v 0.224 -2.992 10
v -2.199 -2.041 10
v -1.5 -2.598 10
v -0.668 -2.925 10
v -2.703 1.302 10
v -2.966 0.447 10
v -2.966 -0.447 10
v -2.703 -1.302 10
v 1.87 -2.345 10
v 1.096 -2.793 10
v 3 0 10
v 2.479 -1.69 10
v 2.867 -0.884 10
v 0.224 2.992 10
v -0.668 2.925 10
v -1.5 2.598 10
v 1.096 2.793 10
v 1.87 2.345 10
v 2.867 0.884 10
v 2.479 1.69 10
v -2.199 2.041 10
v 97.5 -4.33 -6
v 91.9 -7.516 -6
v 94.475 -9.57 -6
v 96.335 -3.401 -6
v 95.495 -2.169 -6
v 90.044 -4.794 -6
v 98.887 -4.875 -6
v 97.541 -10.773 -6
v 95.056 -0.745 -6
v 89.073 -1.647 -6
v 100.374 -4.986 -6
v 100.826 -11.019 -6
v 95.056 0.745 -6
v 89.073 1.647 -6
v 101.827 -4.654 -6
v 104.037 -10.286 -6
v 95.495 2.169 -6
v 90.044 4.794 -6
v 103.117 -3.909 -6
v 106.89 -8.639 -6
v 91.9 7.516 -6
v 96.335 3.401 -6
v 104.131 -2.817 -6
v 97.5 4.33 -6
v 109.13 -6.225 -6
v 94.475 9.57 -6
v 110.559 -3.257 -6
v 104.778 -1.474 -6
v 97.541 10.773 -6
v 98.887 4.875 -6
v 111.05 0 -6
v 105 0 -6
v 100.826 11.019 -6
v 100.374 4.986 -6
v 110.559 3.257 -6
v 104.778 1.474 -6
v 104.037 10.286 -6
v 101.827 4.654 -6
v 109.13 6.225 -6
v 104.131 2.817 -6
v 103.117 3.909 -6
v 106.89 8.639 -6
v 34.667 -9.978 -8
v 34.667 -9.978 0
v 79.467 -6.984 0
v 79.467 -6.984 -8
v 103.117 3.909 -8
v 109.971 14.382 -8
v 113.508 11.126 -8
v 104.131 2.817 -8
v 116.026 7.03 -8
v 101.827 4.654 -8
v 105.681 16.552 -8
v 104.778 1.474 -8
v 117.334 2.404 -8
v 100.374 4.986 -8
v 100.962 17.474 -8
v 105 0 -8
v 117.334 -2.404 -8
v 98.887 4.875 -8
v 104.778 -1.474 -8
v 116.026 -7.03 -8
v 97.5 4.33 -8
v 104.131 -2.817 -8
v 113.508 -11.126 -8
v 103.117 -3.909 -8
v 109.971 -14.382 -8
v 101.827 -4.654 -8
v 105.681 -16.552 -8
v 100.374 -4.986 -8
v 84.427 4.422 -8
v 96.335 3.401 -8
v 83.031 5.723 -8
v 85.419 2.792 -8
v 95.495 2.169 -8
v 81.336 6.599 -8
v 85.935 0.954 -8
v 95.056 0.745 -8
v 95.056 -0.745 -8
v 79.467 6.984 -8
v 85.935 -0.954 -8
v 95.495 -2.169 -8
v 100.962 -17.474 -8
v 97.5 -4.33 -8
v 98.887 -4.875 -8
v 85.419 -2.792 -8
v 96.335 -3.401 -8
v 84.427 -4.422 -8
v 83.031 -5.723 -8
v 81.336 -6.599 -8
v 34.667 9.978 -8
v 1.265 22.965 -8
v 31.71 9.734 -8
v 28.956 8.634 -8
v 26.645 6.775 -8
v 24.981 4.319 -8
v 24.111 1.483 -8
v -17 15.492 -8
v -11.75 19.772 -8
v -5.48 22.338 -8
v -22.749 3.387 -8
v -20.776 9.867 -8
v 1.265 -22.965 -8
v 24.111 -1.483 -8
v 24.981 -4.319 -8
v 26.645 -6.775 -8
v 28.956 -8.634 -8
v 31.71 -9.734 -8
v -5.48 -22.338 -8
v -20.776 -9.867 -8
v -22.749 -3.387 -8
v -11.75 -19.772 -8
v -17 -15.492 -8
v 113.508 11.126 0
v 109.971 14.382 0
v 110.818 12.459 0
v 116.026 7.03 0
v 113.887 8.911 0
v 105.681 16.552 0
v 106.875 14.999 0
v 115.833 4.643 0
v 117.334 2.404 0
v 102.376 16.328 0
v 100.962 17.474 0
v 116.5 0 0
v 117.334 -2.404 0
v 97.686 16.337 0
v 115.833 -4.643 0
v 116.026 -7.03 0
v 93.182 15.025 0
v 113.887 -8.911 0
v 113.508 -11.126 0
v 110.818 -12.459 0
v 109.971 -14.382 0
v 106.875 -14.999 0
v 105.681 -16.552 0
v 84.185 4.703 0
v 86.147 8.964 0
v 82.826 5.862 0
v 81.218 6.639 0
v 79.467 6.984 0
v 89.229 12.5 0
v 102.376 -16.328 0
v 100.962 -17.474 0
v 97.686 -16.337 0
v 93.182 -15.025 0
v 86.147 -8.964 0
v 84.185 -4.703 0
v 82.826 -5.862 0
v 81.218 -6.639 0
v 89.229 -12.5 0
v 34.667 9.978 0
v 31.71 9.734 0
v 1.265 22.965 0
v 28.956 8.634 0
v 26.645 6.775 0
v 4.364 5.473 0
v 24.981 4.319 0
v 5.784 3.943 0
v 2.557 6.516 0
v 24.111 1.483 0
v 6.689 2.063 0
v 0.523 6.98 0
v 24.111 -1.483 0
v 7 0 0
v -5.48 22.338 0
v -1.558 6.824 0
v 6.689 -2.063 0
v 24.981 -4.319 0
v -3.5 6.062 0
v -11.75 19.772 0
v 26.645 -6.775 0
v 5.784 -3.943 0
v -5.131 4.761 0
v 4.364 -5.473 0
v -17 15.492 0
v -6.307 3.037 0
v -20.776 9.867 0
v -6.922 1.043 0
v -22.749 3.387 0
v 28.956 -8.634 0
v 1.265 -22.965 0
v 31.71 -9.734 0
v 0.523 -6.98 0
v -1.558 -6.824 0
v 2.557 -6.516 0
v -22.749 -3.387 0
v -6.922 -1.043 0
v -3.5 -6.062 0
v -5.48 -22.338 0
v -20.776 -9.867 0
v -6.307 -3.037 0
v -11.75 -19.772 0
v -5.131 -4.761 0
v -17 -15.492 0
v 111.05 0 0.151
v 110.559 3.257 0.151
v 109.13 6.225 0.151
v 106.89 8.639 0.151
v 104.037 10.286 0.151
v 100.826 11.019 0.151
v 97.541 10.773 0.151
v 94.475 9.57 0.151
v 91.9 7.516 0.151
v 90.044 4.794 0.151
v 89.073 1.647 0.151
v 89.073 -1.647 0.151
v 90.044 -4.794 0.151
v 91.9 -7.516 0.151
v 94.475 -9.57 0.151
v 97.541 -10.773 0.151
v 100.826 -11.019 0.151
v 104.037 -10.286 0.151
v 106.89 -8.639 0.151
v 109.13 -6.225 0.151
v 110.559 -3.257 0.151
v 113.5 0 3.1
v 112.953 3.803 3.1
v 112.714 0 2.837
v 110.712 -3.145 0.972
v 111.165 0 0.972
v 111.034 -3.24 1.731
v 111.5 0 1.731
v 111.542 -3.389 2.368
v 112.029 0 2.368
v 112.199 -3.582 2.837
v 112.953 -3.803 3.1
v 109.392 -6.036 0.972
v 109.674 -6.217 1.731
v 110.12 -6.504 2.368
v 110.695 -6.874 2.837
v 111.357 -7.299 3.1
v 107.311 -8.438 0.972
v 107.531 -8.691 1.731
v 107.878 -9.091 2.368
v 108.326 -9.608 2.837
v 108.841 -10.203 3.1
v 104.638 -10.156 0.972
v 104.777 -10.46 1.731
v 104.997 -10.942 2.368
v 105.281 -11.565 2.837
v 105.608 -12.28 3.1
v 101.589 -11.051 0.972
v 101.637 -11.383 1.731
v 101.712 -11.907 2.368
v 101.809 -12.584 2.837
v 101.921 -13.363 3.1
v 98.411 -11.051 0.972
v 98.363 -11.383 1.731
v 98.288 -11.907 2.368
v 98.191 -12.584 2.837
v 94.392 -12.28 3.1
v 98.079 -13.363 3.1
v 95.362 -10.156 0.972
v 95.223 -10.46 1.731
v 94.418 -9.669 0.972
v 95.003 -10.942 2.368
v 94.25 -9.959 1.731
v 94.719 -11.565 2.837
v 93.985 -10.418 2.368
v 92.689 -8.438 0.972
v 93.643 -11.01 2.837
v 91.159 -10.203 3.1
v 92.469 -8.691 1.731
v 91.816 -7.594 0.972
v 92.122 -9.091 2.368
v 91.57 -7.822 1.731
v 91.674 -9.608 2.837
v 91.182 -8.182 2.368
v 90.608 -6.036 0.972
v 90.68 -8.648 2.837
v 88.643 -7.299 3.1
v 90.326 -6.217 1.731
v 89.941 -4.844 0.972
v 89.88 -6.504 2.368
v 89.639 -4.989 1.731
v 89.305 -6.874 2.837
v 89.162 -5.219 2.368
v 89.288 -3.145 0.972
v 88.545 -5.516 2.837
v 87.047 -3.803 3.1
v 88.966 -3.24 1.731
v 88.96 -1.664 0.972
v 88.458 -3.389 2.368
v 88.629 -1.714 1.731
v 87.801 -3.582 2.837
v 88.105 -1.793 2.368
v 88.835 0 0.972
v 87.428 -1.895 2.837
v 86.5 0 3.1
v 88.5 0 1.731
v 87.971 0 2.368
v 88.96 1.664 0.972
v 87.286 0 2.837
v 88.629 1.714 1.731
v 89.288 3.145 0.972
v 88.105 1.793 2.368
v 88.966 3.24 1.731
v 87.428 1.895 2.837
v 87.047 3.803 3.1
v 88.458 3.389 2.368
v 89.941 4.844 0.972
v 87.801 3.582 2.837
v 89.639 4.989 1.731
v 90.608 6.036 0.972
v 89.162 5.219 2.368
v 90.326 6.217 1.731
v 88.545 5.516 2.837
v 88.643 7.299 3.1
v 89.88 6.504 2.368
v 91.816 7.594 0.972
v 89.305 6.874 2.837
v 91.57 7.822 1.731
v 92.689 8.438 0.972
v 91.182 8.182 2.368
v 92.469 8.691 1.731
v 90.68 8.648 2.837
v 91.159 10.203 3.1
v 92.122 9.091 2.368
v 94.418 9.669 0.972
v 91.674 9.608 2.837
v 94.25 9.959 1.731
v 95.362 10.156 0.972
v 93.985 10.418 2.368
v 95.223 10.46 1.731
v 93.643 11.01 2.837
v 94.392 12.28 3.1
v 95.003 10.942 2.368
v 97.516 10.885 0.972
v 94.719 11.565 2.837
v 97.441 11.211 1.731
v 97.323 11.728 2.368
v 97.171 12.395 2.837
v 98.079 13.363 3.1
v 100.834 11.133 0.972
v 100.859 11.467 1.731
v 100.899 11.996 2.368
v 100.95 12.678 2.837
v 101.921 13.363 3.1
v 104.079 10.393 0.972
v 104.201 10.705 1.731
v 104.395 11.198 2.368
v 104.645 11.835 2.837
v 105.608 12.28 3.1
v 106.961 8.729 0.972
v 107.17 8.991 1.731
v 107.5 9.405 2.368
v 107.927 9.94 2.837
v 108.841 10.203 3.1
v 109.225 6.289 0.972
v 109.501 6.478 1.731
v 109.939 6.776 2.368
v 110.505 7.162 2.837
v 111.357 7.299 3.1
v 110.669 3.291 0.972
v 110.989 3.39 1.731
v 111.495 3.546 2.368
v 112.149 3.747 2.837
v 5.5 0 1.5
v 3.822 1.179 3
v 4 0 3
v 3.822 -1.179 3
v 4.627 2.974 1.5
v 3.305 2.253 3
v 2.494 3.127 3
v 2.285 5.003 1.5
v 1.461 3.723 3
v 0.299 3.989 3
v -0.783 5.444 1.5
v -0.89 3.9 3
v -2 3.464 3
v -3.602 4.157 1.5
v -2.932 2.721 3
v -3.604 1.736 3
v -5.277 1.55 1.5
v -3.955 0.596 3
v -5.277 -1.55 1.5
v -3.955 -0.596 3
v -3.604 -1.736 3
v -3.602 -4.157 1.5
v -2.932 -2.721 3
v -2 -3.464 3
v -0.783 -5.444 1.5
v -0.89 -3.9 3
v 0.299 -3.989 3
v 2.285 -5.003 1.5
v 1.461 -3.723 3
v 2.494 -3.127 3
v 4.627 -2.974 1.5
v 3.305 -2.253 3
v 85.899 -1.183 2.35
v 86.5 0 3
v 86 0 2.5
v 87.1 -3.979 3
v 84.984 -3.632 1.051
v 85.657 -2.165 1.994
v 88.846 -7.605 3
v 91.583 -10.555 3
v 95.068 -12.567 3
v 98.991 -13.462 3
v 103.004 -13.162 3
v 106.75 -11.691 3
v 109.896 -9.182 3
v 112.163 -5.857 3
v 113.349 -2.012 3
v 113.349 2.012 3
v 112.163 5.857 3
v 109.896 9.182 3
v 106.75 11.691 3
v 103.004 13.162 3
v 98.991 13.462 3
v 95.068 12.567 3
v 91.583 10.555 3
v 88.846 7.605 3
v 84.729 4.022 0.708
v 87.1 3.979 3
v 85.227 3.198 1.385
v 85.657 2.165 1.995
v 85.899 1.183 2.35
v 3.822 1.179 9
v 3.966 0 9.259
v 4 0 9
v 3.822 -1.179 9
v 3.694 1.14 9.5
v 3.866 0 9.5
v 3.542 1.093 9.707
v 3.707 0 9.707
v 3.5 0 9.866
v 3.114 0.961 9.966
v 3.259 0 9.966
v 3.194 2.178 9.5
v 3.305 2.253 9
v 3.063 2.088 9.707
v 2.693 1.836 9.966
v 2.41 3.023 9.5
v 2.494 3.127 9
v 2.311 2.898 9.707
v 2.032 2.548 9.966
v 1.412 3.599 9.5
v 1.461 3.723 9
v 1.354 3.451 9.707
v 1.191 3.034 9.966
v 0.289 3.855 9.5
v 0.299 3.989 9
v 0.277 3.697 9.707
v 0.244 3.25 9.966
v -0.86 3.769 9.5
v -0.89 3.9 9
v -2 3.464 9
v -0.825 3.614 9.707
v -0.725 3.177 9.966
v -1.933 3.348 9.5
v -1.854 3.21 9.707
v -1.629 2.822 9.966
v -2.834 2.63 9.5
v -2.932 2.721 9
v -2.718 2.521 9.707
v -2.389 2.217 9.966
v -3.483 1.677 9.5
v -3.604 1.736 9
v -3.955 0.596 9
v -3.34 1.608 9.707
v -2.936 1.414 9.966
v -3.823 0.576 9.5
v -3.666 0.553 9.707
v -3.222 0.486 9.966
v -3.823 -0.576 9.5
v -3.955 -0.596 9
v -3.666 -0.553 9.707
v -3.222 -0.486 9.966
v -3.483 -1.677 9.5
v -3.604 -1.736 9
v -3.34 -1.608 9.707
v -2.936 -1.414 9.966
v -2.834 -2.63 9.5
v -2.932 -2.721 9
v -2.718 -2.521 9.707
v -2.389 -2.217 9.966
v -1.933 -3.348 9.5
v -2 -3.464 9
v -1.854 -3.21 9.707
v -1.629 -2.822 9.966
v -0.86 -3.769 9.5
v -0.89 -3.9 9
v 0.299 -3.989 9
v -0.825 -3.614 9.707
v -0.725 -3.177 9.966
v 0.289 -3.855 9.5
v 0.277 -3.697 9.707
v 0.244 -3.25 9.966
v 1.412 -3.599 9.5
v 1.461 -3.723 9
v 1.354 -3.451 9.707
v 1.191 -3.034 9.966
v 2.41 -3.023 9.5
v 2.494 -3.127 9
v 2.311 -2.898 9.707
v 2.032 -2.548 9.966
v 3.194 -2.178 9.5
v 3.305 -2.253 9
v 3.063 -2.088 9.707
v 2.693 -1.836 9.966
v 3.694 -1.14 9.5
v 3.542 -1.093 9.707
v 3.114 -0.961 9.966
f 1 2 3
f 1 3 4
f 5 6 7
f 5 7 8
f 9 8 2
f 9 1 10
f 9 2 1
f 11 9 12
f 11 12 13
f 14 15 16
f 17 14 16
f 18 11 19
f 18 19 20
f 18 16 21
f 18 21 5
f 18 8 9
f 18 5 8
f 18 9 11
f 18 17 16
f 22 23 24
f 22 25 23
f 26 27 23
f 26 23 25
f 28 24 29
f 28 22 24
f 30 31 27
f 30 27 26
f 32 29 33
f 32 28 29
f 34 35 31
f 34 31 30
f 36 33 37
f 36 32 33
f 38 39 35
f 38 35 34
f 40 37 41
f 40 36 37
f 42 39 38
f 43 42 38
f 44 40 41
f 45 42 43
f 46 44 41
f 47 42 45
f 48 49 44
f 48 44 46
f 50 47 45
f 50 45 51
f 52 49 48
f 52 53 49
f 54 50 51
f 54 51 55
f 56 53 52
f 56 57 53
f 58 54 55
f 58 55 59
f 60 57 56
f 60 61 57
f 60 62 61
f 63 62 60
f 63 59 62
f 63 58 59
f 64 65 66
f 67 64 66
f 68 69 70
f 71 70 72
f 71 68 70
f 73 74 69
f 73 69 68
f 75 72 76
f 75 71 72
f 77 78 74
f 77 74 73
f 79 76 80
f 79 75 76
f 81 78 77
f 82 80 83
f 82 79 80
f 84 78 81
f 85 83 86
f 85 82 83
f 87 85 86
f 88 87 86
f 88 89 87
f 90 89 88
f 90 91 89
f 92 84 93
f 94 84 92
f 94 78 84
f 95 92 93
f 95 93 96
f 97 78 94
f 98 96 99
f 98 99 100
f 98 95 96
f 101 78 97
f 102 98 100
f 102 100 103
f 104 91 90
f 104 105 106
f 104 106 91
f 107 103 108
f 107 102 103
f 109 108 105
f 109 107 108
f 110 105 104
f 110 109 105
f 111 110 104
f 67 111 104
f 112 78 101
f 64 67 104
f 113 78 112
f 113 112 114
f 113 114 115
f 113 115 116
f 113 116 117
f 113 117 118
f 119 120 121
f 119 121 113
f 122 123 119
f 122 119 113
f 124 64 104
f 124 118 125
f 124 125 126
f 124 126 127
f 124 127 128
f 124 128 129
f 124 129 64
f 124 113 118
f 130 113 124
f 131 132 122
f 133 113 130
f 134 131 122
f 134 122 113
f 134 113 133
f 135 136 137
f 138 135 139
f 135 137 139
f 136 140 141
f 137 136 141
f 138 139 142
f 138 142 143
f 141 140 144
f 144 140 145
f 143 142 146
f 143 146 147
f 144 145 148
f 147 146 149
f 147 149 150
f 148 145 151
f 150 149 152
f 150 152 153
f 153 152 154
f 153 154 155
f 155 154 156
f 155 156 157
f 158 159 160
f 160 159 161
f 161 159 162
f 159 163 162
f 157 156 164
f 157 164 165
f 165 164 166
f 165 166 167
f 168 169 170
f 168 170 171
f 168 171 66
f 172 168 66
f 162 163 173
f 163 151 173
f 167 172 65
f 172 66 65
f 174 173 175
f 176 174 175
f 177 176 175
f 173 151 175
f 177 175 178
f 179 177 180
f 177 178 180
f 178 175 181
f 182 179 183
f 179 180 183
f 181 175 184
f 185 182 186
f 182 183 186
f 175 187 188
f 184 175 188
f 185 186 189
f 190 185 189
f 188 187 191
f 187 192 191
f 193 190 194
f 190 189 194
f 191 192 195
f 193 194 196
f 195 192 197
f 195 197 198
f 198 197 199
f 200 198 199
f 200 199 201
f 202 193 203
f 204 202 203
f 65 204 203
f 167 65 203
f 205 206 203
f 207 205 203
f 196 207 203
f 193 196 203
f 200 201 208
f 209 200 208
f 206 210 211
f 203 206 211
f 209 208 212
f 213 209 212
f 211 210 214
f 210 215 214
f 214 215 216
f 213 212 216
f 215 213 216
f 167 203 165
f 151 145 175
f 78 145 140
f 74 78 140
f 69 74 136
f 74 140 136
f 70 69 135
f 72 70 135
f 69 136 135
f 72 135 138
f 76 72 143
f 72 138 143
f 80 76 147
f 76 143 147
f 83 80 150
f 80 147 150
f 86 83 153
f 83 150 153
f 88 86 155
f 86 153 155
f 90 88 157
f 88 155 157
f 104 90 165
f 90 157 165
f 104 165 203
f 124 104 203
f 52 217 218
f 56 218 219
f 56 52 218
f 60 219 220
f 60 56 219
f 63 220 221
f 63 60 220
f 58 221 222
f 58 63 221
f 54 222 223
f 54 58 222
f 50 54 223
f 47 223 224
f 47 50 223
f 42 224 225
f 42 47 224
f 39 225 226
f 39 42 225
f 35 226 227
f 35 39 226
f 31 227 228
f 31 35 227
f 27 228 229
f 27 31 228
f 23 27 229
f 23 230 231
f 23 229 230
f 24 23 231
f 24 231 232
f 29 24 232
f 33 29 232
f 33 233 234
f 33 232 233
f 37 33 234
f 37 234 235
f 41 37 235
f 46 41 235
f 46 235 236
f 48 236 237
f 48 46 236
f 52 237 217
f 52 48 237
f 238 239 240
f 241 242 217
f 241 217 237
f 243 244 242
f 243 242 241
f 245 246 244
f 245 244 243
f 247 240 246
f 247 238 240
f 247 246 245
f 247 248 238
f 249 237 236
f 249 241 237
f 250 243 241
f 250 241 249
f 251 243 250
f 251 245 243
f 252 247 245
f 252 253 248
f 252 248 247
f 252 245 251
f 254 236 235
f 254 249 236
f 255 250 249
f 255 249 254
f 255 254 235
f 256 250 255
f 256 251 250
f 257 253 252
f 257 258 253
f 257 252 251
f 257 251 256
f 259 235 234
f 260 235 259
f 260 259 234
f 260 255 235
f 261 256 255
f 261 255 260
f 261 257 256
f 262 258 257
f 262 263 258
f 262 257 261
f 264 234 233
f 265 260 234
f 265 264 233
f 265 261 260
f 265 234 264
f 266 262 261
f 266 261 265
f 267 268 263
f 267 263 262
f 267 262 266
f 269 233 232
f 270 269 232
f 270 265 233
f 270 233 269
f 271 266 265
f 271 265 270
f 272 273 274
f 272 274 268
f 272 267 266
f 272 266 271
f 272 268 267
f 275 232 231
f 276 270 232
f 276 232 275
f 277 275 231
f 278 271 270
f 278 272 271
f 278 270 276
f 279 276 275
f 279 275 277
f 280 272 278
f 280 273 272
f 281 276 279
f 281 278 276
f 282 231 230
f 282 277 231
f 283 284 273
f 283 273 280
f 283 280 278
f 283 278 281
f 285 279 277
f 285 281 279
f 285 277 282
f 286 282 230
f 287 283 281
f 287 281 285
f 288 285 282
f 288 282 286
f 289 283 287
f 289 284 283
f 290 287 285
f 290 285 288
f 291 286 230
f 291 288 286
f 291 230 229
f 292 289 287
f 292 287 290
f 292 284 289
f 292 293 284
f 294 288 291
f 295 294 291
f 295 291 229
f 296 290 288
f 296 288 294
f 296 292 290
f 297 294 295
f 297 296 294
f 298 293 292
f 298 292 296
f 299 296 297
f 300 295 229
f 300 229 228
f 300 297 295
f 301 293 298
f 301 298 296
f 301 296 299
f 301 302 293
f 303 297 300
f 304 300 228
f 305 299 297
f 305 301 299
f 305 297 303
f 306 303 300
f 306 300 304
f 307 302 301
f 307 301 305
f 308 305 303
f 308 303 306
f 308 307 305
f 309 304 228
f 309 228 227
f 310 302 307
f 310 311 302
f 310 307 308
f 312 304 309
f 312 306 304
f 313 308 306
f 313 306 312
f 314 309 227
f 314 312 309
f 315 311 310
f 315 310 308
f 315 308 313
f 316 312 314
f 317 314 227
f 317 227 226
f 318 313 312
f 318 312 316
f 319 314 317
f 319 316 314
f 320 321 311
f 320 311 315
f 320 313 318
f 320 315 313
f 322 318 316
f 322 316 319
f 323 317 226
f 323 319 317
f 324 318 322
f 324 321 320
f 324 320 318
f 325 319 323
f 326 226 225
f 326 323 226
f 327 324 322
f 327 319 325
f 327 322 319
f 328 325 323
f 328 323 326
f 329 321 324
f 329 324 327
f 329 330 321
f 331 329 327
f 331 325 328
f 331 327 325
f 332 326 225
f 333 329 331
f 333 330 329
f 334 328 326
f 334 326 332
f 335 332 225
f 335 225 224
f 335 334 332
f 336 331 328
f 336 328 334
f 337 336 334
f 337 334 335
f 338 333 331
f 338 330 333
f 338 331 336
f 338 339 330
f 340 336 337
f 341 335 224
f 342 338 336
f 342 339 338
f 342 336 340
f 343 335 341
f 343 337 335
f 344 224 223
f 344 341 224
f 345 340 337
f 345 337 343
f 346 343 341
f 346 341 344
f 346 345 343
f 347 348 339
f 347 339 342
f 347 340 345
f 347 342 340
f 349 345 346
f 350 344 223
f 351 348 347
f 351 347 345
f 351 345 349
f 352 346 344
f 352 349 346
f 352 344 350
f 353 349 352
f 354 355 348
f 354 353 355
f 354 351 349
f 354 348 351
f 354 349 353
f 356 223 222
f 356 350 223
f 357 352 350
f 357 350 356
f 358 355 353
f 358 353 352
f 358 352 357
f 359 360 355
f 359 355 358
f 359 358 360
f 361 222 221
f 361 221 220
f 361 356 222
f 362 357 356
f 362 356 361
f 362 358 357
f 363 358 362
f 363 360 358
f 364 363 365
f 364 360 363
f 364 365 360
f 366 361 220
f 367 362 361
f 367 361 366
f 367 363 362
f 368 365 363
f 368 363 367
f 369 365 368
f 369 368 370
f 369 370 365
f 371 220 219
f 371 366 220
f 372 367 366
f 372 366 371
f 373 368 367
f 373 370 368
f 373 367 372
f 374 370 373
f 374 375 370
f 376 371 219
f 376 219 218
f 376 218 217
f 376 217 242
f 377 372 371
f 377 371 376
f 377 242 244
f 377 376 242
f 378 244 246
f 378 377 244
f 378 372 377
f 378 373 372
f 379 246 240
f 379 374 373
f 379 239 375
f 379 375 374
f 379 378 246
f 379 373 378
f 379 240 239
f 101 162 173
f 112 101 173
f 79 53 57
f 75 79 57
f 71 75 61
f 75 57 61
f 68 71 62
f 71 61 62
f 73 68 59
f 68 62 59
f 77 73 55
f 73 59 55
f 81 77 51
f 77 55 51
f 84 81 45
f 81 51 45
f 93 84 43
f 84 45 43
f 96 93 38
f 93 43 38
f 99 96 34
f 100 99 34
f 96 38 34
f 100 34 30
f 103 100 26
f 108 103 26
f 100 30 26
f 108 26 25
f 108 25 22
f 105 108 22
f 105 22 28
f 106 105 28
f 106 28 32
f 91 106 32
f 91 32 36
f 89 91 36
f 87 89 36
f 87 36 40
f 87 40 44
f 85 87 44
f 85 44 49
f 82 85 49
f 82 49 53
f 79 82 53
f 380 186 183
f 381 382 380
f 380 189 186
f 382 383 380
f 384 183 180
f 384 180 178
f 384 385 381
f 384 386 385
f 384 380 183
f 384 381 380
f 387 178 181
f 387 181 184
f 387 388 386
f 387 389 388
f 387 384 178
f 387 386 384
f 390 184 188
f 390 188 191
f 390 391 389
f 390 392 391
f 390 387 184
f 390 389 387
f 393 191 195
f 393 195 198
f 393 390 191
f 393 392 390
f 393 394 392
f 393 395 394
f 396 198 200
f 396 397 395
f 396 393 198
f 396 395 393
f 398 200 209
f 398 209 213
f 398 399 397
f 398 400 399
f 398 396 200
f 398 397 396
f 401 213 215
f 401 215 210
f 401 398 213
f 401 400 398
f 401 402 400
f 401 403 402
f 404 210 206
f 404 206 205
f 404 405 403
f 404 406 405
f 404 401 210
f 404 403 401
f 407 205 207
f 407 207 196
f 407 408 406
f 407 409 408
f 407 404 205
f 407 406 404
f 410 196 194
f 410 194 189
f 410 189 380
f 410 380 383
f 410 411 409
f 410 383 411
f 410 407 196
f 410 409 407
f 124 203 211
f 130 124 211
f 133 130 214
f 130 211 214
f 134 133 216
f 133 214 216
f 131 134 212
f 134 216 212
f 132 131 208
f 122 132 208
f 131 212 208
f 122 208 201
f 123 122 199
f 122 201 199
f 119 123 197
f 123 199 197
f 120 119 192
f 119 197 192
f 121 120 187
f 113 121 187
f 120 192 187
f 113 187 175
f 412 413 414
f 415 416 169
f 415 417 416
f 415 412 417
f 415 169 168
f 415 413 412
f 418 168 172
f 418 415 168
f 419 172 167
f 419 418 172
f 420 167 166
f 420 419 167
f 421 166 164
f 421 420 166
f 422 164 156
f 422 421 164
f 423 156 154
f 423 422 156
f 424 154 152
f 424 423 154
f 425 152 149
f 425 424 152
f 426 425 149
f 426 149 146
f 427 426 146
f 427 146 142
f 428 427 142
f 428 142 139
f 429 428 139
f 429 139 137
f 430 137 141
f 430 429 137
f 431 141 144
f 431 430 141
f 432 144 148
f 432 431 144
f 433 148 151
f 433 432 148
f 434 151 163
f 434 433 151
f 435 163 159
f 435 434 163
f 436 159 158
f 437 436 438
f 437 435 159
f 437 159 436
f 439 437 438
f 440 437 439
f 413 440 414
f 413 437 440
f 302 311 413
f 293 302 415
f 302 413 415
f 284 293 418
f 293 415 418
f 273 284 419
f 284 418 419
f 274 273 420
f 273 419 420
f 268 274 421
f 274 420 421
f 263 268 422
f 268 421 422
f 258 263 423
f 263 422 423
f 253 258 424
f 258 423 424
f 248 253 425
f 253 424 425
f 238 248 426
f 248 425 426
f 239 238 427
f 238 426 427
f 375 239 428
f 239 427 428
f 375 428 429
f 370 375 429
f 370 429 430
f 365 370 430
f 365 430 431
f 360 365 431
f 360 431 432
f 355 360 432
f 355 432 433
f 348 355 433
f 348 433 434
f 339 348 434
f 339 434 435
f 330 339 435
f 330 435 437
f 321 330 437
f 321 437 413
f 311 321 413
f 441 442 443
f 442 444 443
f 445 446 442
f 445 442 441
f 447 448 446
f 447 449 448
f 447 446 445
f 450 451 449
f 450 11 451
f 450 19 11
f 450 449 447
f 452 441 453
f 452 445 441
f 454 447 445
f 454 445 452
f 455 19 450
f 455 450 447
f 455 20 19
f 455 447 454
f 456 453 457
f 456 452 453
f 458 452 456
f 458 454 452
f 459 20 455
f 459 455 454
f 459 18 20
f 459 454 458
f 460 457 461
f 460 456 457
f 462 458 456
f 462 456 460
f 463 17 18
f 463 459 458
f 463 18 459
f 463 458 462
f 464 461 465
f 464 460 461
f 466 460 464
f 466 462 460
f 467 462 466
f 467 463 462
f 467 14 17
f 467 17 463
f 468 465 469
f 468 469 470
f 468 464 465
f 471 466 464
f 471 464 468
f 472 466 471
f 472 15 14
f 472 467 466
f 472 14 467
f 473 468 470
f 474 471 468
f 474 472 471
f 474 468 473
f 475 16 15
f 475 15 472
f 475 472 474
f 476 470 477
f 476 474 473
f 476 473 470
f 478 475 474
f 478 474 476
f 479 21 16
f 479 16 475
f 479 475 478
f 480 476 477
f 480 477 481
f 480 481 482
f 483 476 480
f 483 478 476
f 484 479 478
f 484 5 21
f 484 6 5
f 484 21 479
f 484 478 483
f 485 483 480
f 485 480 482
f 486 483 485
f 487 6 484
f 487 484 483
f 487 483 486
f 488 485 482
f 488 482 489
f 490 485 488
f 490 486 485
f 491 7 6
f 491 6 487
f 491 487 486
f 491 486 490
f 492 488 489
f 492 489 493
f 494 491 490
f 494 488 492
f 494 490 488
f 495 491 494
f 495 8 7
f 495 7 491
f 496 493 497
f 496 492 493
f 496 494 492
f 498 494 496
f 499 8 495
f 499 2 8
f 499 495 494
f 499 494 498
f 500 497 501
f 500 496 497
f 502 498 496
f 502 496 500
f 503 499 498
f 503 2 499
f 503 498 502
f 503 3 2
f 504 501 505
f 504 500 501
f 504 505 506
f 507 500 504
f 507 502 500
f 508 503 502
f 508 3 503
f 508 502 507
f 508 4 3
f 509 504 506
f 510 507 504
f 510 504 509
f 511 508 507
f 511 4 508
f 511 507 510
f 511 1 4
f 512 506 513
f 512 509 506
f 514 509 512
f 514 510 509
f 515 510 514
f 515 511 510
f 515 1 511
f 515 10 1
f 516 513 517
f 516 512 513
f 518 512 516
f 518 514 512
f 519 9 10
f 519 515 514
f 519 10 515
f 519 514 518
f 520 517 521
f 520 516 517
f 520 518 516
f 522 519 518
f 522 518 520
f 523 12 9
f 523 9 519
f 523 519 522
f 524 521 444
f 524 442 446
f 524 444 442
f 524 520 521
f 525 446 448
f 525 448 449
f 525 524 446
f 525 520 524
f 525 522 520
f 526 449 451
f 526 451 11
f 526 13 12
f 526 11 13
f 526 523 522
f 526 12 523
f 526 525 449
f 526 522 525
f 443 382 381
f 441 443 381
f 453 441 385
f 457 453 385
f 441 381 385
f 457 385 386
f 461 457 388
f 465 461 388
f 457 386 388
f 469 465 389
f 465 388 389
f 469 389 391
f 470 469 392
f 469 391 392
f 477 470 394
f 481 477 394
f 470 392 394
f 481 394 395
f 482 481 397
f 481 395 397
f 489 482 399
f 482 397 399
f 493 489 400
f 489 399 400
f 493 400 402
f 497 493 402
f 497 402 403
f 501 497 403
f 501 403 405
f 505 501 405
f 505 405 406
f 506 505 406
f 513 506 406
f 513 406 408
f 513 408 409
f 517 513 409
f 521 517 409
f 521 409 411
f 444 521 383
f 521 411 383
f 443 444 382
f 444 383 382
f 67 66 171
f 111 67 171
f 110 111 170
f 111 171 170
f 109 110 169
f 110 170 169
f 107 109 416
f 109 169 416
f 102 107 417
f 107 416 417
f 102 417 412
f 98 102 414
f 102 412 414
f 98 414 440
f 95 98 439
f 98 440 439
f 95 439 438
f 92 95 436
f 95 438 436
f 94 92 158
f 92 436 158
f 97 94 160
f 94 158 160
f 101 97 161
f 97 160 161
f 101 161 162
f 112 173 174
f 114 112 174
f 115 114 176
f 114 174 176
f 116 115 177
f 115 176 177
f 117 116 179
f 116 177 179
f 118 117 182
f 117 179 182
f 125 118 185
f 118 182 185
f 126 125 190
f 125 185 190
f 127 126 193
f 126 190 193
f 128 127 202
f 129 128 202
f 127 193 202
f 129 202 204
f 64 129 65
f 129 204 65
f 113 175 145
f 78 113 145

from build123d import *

# Parameters (mm, degrees)
SKETCH5_R           = 4
BOSS_EXTRUDE1_DEPTH = 10
SKETCH13_R          = 5.0000000000000036
BOSS_EXTRUDE5_DEPTH = 8
CHAMFER1_SIZE       = 3
FILLET1_R           = 1
SKETCH14_R          = 13.499999999999998
BOSS_EXTRUDE6_DEPTH = 3.1
CUT_EXTRUDE1_START  = -6
SKETCH15_R          = 11.050000000000002
CUT_EXTRUDE1_DEPTH  = 20
FILLET2_R           = 3
CHAMFER2_SIZE       = 3


with BuildPart() as part:
    # Sketch5 → Boss-Extrude1 (new body)
    with BuildSketch(Plane(origin=(0, 0, 0), x_dir=(0, 1, 0), z_dir=(0, 0, 1))):
        with Locations(Location((0, 0, 0), (0, 0, 270))):
            Circle(SKETCH5_R)
    extrude(amount=BOSS_EXTRUDE1_DEPTH)

    # Sketch13 → Boss-Extrude5 (add)
    with BuildSketch(Plane(origin=(0, 0, 0), x_dir=(0, 1, 0), z_dir=(0, 0, 1))):
        with BuildLine():
            Line((-17.473511202674743, -100.9625), (-22.96518615208682, -1.2650000000000037))
            ThreePointArc((-22.96518615208682, -1.2650000000000037), (1.41e-15, 23.000000000000004), (22.96518615208682, -1.2649999999999981))
            Line((22.96518615208682, -1.2649999999999981), (17.47351120267477, -100.9625))
            ThreePointArc((17.47351120267477, -100.9625), (1.332e-14, -117.5), (-17.473511202674743, -100.9625))
        make_face()
        with Locations(Location((1.225e-14, -100, 0), (0, 0, 270))):
            Circle(SKETCH13_R, mode=Mode.SUBTRACT)
        with BuildLine():
            Line((-9.977753031397176, -34.66666666666667), (-6.984427121978019, -79.46666666666665))
            ThreePointArc((-6.984427121978019, -79.46666666666665), (8.55e-15, -86), (6.9844271219780385, -79.46666666666665))
            Line((6.9844271219780385, -79.46666666666665), (9.977753031397182, -34.66666666666667))
            ThreePointArc((9.977753031397182, -34.66666666666667), (4.78e-15, -24), (-9.977753031397176, -34.66666666666667))
        make_face(mode=Mode.SUBTRACT)
    extrude(amount=-BOSS_EXTRUDE5_DEPTH)

    # Chamfer1
    chamfer1_edges = [part.edges().sort_by_distance(p)[0] for p in [
        (-4, 1.22e-15, 0),
    ]]
    chamfer(chamfer1_edges, length=CHAMFER1_SIZE)

    # Fillet1
    fillet1_edges = [part.edges().sort_by_distance(p)[0] for p in [
        (-4, 1.22e-15, 10),
    ]]
    fillet(fillet1_edges, radius=FILLET1_R)

    # Sketch14 → Boss-Extrude6 (add)
    with BuildSketch(Plane(origin=(0, 0, 0), x_dir=(0, 1, 0), z_dir=(0, 0, 1))):
        with Locations(Location((1.225e-14, -100, 0), (0, 0, 90))):
            Circle(SKETCH14_R)
    extrude(amount=BOSS_EXTRUDE6_DEPTH)

    # Sketch15 → Cut-Extrude1 (cut)
    with BuildSketch(Plane(origin=(0, 0, 0), x_dir=(0, 1, 0), z_dir=(0, 0, 1)).offset(CUT_EXTRUDE1_START)):
        with Locations(Location((1.225e-14, -100, 0), (0, 0, 270))):
            Circle(SKETCH15_R)
    extrude(amount=CUT_EXTRUDE1_DEPTH, mode=Mode.SUBTRACT)

    # Fillet2
    # the kernel refuses this fillet: 3 mm, written as the material it takes off along each edge
    with BuildSketch(Plane(origin=(100, 1.225e-14, 3.0999999999999996), x_dir=(1, -1.8e-16, 0), z_dir=(1.8e-16, 1, 0))) as fillet2_piece_1:
        with BuildLine():
            CenterArc((14.049999999999997, 2.949152420612873), FILLET2_R, 180, 79.43602241094561)
            Line((11.049999999999997, 2.949152420612873), (10.989999999999995, 2.949152420612873))
            Line((10.989999999999995, 2.949152420612873), (10.989999999999995, 0))
            Line((10.989999999999995, 0), (11.049999999999997, -0.06000000000000005))
            ThreePointArc((11.049999999999997, -0.06000000000000005), (12.275000000000105, -0.0600000000000005), (13.489000000000217, -0.05898304841112623))
            Line((13.489000000000217, -0.05898304841112623), (13.500000000000213, 1.10889e-12))
        make_face()
    revolve(axis=Axis((100, 1.225e-14, 3.0999999999999996), (0, 0, -1)), mode=Mode.SUBTRACT)

    # Chamfer2
    # the kernel refuses this chamfer: 3 mm, written as the material it adds along each edge
    with BuildSketch(Plane(origin=(100, 1.225e-14, 0), x_dir=(-1, 6e-17, 0), z_dir=(6e-17, 1, 0))) as chamfer2_piece_1_section:
        Polygon((13.5 + CHAMFER2_SIZE, 0), (13.5, CHAMFER2_SIZE), (13.5, 0), align=None)
    chamfer2_piece_1 = revolve(axis=Axis((100, 1.225e-14, 0), (0, 0, 1)), mode=Mode.PRIVATE)
    chamfer2_piece_1 = chamfer2_piece_1 - Plane(origin=(78.99999999999999, 9.77e-15, 1.4464911380903063), x_dir=(0.0666666666666669, -0.9977753031397177, 0), z_dir=(0, 0, 1)) * Cylinder(7.000000000000007, 66, mode=Mode.PRIVATE)
    add(chamfer2_piece_1)


solid = part.part
